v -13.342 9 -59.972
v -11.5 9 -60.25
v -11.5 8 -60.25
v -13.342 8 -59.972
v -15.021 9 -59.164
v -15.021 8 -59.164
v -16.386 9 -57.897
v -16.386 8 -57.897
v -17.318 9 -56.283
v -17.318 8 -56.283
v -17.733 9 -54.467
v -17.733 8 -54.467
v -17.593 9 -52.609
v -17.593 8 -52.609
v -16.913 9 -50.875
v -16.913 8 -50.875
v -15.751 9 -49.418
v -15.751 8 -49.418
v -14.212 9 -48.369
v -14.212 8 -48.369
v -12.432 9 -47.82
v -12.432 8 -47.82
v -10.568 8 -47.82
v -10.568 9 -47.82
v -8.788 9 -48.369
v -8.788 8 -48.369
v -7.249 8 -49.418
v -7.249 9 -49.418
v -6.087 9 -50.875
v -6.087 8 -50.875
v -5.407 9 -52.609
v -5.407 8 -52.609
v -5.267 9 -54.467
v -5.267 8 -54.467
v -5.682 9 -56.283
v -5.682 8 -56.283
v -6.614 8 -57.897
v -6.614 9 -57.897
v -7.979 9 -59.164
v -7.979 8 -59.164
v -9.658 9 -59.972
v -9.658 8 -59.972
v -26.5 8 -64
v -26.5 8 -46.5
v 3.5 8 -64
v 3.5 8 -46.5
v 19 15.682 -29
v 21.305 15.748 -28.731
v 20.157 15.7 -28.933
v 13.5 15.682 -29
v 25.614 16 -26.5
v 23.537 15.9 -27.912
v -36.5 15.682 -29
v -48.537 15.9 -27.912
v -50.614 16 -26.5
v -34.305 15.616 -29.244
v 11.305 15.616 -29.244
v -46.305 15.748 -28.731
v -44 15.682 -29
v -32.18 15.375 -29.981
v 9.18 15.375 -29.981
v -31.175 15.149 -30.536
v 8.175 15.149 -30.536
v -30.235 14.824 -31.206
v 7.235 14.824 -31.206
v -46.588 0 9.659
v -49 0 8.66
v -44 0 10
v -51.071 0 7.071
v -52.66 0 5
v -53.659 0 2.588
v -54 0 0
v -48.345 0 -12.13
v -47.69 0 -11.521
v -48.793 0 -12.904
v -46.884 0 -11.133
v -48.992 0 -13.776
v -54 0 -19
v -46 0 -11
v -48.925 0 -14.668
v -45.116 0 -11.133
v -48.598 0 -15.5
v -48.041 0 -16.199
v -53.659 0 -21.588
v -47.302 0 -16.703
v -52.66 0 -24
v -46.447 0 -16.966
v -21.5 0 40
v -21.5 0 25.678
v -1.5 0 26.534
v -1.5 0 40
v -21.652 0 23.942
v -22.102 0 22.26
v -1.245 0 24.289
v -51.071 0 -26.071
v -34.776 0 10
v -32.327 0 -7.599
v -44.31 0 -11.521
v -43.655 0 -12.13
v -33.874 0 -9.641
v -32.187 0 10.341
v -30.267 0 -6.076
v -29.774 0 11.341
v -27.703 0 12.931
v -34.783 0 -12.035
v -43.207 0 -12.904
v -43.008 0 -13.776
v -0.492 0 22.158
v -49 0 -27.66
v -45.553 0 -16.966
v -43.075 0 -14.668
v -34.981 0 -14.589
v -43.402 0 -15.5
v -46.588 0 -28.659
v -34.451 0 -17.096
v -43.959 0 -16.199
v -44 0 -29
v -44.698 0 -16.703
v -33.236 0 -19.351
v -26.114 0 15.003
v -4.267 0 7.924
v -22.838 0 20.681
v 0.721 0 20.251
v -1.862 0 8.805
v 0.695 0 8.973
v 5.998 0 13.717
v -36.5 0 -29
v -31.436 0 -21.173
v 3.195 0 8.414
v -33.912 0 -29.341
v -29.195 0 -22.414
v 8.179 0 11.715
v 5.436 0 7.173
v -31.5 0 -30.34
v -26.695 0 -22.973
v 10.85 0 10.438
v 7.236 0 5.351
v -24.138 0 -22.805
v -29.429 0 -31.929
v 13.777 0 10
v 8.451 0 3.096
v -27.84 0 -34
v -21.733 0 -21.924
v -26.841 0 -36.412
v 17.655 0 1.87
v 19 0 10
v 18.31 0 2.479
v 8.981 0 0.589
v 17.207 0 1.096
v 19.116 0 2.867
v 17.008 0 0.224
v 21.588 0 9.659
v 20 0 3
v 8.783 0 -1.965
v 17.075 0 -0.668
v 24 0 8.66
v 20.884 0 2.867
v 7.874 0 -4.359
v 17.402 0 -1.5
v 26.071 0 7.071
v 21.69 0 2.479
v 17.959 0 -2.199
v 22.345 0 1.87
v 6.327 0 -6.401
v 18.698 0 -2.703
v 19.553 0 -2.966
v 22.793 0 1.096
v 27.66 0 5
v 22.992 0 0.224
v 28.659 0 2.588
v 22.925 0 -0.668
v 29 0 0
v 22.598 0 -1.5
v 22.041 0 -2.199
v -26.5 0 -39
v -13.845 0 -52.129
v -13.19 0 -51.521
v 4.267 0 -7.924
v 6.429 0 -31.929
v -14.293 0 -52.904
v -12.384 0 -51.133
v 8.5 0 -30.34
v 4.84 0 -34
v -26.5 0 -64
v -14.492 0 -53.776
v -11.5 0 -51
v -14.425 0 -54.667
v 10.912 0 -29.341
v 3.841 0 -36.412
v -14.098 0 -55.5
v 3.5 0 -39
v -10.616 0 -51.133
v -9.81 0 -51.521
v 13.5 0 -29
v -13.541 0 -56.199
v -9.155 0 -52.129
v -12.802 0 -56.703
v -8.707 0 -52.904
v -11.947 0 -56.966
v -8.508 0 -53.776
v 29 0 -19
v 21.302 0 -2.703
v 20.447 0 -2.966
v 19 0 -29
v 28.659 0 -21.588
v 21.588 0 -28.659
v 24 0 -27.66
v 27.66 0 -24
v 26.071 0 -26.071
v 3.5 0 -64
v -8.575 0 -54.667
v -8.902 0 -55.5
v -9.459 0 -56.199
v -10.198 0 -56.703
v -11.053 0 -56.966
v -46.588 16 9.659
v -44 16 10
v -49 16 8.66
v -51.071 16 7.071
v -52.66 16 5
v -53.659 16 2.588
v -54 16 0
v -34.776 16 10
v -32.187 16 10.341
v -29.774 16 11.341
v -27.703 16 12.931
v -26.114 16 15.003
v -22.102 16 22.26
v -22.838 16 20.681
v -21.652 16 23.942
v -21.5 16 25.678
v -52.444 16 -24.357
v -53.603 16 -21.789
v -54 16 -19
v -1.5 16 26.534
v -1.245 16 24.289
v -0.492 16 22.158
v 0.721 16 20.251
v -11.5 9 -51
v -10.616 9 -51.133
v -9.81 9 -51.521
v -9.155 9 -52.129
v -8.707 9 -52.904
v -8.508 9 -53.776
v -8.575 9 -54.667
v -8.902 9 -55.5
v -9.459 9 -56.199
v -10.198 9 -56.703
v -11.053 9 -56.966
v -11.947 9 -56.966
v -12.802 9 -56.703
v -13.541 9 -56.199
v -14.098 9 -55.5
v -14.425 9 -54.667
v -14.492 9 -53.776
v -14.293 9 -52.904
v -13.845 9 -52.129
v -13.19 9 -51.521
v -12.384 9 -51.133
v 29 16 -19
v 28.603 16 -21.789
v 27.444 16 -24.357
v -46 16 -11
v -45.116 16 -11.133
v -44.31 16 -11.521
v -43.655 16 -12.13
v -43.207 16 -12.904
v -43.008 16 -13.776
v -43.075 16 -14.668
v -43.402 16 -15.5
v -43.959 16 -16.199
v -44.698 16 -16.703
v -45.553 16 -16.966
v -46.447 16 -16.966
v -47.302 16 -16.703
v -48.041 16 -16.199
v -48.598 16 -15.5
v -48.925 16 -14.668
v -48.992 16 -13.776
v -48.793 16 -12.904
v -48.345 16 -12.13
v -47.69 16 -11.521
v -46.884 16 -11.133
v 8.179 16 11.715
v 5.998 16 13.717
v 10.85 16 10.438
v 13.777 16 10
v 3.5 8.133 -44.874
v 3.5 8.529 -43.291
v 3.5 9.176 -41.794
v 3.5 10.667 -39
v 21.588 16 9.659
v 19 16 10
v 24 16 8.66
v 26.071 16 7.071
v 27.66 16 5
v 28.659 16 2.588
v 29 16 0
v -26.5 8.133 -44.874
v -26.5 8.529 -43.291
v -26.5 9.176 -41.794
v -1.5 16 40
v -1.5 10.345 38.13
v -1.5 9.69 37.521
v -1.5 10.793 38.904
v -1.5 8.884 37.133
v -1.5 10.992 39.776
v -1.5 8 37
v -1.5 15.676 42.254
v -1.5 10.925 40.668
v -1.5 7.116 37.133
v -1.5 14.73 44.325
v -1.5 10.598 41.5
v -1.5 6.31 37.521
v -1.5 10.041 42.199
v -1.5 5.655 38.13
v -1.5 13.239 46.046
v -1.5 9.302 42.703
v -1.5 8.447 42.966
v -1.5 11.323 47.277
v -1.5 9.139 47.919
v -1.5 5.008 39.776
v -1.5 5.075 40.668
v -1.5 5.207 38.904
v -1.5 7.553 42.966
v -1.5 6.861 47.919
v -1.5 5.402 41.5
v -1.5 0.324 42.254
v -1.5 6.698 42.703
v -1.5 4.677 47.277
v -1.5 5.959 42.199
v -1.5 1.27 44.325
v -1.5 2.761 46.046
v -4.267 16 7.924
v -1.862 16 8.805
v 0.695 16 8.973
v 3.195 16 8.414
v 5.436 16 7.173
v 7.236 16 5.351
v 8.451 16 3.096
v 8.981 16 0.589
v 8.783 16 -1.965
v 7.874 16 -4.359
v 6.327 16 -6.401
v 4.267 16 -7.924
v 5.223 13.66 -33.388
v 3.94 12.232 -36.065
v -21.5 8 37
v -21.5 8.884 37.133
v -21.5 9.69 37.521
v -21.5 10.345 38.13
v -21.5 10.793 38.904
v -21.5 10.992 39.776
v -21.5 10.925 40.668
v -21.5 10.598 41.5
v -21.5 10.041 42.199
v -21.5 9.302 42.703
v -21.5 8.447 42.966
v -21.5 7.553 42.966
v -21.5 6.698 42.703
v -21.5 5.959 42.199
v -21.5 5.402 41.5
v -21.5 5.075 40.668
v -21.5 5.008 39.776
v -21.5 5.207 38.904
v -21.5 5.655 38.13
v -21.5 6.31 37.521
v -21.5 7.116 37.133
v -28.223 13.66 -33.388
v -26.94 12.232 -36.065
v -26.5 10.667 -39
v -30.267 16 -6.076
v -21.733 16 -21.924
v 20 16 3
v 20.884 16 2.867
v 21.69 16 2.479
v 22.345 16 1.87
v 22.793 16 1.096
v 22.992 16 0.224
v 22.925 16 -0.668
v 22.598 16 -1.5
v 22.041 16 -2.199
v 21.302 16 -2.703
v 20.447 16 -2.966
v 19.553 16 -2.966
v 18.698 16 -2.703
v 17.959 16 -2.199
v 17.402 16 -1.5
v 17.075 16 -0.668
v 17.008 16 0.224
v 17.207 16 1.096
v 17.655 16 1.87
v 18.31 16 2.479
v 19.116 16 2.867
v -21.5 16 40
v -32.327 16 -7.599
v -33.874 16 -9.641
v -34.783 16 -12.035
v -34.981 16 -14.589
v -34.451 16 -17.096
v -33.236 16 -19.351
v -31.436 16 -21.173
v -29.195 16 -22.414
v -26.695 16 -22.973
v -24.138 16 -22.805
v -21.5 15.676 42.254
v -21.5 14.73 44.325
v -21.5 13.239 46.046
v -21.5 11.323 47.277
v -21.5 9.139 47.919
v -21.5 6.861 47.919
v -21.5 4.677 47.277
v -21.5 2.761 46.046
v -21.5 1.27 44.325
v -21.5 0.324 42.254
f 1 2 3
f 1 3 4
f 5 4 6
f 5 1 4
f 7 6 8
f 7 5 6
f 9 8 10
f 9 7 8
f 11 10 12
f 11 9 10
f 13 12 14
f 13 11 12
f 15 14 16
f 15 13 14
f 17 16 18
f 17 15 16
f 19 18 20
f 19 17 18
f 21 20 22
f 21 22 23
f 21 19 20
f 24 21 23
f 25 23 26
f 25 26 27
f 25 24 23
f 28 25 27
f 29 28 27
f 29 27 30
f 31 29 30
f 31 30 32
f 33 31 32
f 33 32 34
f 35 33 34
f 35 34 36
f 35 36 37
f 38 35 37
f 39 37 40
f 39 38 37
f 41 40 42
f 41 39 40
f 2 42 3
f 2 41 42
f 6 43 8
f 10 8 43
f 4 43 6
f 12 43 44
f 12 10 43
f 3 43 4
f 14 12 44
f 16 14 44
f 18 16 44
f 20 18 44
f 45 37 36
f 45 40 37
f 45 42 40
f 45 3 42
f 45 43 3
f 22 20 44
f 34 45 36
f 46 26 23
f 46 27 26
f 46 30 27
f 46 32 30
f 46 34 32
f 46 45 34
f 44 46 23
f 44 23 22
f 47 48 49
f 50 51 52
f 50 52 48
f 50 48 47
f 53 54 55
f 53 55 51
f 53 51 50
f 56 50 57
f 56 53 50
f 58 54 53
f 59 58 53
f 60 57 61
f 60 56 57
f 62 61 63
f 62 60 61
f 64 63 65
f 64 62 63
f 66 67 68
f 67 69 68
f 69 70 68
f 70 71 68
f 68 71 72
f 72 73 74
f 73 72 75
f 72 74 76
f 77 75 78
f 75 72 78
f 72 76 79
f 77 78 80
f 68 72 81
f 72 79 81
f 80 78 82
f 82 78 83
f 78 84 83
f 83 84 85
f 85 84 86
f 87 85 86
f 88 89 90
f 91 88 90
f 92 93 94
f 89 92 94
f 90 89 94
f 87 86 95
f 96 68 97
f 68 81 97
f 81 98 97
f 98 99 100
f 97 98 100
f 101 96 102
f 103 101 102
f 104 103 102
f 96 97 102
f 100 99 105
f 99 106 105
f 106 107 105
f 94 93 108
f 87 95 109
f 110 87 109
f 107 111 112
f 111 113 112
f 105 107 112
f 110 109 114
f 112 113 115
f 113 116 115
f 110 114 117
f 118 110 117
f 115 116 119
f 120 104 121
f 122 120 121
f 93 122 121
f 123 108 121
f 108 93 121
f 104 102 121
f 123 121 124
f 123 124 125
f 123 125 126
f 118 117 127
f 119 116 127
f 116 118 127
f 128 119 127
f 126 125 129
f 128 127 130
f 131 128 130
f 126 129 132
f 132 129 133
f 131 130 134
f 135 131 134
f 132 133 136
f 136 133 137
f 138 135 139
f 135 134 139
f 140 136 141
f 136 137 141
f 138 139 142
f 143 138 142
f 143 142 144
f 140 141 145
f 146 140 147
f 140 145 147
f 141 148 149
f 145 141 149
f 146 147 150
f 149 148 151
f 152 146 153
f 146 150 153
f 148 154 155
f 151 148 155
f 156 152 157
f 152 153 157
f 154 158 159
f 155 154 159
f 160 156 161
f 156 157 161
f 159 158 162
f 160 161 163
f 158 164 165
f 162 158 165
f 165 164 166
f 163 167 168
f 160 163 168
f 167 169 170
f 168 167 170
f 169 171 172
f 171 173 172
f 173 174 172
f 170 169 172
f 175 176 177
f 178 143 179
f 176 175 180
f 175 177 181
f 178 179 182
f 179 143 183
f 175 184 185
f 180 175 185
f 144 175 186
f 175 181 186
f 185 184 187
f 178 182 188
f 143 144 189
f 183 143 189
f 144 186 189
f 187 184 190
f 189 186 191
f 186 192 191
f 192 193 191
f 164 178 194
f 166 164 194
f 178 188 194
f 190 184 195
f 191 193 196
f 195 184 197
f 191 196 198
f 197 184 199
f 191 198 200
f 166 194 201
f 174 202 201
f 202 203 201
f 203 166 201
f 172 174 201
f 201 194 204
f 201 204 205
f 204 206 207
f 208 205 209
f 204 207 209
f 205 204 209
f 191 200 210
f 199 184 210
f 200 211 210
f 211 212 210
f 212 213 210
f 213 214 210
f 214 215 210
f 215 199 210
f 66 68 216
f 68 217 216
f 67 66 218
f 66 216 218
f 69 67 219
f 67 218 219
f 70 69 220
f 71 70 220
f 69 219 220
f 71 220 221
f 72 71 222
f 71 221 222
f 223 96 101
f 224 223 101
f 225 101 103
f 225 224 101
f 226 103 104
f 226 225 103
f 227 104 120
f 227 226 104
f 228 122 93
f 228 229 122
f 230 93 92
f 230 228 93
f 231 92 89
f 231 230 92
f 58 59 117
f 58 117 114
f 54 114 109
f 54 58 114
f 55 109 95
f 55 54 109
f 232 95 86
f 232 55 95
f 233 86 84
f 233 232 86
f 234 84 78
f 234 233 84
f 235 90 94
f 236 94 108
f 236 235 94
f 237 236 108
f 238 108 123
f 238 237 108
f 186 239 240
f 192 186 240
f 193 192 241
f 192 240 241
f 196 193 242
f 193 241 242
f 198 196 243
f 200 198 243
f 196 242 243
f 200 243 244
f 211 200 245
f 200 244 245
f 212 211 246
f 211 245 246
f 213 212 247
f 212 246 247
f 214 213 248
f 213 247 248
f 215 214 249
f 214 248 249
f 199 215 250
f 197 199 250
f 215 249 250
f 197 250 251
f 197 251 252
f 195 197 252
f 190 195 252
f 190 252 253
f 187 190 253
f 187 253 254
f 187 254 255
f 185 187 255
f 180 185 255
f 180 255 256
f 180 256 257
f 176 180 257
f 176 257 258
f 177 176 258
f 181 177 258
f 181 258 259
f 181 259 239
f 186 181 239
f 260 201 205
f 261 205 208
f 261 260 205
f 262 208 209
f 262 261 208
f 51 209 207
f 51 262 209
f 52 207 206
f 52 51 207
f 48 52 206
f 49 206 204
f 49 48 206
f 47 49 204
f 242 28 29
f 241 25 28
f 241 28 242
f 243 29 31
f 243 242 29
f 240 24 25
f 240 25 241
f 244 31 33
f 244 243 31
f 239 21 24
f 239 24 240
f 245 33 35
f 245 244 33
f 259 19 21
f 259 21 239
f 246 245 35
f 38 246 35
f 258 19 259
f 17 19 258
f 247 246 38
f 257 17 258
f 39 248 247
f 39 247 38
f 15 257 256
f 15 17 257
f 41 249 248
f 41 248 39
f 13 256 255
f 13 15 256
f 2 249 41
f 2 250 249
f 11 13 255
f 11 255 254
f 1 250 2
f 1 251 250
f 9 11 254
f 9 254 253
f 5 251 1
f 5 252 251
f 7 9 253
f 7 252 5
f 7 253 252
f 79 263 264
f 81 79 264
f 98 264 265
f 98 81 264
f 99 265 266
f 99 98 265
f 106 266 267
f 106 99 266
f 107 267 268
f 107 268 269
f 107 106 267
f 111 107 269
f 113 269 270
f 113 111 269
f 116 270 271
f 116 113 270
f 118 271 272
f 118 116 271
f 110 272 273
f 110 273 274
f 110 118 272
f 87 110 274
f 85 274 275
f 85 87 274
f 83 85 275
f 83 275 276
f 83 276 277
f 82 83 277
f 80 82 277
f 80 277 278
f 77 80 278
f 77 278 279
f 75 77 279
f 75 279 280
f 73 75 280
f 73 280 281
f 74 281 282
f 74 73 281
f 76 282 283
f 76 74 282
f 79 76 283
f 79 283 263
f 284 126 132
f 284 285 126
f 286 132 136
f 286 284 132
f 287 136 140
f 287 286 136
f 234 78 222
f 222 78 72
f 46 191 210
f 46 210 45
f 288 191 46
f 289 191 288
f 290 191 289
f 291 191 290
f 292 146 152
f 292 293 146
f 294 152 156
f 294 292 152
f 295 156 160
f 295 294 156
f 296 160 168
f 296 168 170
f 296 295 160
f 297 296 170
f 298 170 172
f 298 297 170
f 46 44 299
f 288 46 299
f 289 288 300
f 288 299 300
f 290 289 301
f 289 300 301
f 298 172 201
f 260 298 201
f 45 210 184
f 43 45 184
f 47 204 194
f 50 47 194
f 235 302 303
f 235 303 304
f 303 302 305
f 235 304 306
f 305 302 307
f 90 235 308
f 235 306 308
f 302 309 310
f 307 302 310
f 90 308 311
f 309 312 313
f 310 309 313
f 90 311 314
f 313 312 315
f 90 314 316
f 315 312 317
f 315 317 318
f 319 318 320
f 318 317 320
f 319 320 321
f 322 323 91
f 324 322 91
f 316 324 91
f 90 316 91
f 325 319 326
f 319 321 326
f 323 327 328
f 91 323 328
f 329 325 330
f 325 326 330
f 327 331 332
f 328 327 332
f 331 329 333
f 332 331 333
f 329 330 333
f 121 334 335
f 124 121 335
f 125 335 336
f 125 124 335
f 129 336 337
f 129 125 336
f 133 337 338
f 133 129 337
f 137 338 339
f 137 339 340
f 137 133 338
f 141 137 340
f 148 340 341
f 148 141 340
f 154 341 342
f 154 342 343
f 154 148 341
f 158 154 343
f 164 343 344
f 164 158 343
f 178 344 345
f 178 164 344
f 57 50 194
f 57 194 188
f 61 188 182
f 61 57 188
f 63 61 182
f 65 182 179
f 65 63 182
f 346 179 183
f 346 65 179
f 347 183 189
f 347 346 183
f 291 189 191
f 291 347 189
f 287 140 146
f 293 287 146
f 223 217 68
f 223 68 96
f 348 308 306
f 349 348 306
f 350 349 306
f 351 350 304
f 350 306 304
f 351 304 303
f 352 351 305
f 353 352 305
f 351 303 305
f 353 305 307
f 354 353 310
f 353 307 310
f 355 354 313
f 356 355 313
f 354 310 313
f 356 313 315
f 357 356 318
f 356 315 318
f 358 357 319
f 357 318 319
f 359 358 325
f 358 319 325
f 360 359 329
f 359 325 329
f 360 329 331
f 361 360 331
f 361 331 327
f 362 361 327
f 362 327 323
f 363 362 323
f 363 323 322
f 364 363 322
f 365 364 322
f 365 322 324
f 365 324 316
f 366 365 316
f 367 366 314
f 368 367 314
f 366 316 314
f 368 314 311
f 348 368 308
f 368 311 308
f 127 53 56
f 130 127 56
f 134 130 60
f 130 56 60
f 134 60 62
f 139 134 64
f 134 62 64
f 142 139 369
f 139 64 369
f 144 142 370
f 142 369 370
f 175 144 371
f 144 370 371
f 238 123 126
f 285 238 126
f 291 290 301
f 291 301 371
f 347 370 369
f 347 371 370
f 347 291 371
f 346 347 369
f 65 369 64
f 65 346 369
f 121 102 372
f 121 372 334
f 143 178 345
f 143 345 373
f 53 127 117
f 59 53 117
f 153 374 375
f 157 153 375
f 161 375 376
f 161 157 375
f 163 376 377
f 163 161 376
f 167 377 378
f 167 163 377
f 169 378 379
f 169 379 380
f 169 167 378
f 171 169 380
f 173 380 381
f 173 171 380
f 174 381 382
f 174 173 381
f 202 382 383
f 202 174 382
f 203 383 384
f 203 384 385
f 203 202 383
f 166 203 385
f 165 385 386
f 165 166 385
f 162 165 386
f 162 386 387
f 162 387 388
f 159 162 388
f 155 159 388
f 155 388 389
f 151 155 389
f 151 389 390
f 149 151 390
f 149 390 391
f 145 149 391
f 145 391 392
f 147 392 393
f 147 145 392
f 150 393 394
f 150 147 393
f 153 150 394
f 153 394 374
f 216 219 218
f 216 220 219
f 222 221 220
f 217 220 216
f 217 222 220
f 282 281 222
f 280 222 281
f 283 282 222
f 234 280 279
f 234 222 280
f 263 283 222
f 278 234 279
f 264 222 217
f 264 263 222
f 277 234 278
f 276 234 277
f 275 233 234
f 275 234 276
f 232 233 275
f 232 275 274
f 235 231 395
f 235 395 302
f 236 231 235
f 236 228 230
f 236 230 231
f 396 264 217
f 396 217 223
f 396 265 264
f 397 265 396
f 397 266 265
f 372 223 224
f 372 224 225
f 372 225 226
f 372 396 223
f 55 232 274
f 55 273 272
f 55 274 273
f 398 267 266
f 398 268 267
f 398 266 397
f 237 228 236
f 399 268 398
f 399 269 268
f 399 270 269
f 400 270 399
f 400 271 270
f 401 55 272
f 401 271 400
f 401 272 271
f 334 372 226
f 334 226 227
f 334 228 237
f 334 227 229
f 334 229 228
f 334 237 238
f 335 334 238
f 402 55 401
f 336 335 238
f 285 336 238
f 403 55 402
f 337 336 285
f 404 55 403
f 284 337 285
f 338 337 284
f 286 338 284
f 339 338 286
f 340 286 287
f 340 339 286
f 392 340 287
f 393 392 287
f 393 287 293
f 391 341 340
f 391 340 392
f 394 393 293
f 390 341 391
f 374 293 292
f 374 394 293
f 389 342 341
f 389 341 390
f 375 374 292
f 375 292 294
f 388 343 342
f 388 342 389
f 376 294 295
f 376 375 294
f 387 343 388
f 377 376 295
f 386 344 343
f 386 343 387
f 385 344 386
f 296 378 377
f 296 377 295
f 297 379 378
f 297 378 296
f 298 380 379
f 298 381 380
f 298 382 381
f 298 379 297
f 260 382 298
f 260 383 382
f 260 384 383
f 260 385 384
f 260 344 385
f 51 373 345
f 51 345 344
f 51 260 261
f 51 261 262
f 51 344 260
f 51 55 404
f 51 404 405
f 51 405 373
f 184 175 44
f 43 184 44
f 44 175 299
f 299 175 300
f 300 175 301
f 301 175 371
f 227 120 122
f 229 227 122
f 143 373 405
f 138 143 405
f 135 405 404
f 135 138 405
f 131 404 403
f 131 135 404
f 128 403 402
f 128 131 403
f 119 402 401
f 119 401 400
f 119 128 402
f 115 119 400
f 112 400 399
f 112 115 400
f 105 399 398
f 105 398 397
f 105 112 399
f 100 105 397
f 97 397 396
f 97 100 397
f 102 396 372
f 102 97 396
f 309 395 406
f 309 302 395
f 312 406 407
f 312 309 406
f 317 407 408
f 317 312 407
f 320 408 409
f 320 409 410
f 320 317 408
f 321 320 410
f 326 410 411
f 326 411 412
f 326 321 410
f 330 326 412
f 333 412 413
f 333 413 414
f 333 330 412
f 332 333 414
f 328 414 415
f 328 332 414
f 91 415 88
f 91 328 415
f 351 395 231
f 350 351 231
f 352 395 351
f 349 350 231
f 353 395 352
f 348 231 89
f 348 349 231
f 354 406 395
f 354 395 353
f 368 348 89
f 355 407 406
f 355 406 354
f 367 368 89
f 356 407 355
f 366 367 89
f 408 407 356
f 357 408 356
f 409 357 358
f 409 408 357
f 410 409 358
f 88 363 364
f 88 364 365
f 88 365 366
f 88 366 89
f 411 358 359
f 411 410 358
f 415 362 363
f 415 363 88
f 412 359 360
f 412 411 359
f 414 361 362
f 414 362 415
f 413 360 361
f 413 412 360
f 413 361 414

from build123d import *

# Parameters (mm, degrees)
SKETCH_1_R          = 3
EXTRUDE_1_DEPTH     = 16
SKETCH_5_W          = 20
SKETCH_5_H          = 8
REVOLVE_1_ANGLE     = 180
SKETCH_6_R          = 3
CUT_EXTRUDE_4_DEPTH = 20
CUT_EXTRUDE_3_DEPTH = 30
SKETCH_7_R          = 3
CUT_EXTRUDE_5_DEPTH = 85.118812266
EXTRUDE_START       = 1
SKETCH_9_R          = 6.25
SKETCH_9_R_2        = 3
EXTRUDE_2_DEPTH     = 1
FILLET_1_R          = 10
FILLET_START        = -52
FILLET_2_DEPTH      = 79
FILLET_START_2      = -26.5
FILLET_2_2_DEPTH    = 30


with BuildPart() as part:
    # 草图1 → 凸台-拉伸1 (new body)
    with BuildSketch(Plane(origin=(0, 0, 0), x_dir=(1, 0, 0), z_dir=(0, 1, 0))):
        Polygon((-54, -10.000198617), (-29, -10.000198617), (-21.5, -23), (-21.5, -40), (-1.5, -40), (-1.5, -23), (9, -10.000198617), (29, -10.000198617), (29, 28.999801383), (3.5, 28.999801383), (3.5, 63.999801383), (-26.5, 63.999801383), (-26.5, 28.999801383), (-54, 28.999801383), align=None)
        with Locations(Location((-46, 14, 0), (0, 0, 270))):
            Circle(SKETCH_1_R, mode=Mode.SUBTRACT)
        with Locations(Location((20, 0, 0), (0, 0, 270))):
            Circle(SKETCH_1_R, mode=Mode.SUBTRACT)
        with BuildLine():
            Line((-30.266898407, 6.075760101), (-4.266898407, -7.924239899))
            ThreePointArc((-4.266898407, -7.924239899), (7.924239899, -4.266898407), (4.266898407, 7.924239899))
            Line((4.266898407, 7.924239899), (-21.733101593, 21.924239899))
            ThreePointArc((-21.733101593, 21.924239899), (-33.924239899, 18.266898407), (-30.266898407, 6.075760101))
        make_face(mode=Mode.SUBTRACT)
    extrude(amount=EXTRUDE_1_DEPTH)

    # 草图5 → 旋转1 (revolve)
    with BuildSketch(Plane.XY.offset(40)):
        with Locations((-11.5, 12)):
            Rectangle(SKETCH_5_W, SKETCH_5_H)
    revolve(axis=Axis((-21.5, 8, 40), (1, 0, 0)), revolution_arc=REVOLVE_1_ANGLE)

    # 草图6 → 切除-拉伸4 (cut)
    with BuildSketch(Plane(origin=(-1.5, 0, 0), x_dir=(0, 0, -1), z_dir=(1, 0, 0))):
        with Locations((-40, 8)):
            Circle(SKETCH_6_R)
    extrude(amount=-CUT_EXTRUDE_4_DEPTH, mode=Mode.SUBTRACT)

    # 草图4 → 切除-拉伸3 (cut)
    with BuildSketch(Plane(origin=(3.5, 0, 0), x_dir=(0, 0, -1), z_dir=(1, 0, 0))):
        Polygon((28.999801383, 16), (63.999801383, 16), (63.999801383, 8), (43.999801383, 8), align=None)
    extrude(amount=-CUT_EXTRUDE_3_DEPTH, mode=Mode.SUBTRACT)

    # 草图7 → 切除-拉伸5 (cut, through all)
    with BuildSketch(Plane(origin=(0, 8, 0), x_dir=(1, 0, 0), z_dir=(0, 1, 0))):
        with Locations(Location((-11.5, 53.999801383, 0), (0, 0, 270))):
            Circle(SKETCH_7_R)
    extrude(amount=-CUT_EXTRUDE_5_DEPTH, mode=Mode.SUBTRACT)

    # 草图9 → 凸台-拉伸2 (add)
    with BuildSketch(Plane(origin=(0, 8, 0), x_dir=(1, 0, 0), z_dir=(0, 1, 0)).offset(EXTRUDE_START)):
        with Locations(Location((-11.5, 53.999801383, 0), (0, 0, 90))):
            Circle(SKETCH_9_R)
        with Locations(Location((-11.5, 53.999801383, 0), (0, 0, 270))):
            Circle(SKETCH_9_R_2, mode=Mode.SUBTRACT)
    extrude(amount=-EXTRUDE_2_DEPTH)

    # 圆角1
    fillet_1_edges = [part.edges().sort_by_distance(p)[0] for p in [
        (-21.5, 8, 23),
        (-29, 8, 10.000198617),
        (-54, 8, 10.000198617),
        (-54, 8, -28.999801383),
        (-26.5, 8, -28.999801383),
        (3.5, 8, -28.999801383),
        (29, 8, -28.999801383),
        (29, 8, 10.000198617),
        (9, 8, 10.000198617),
        (-1.5, 8, 23),
    ]]
    fillet(fillet_1_edges, radius=FILLET_1_R)

    # 圆角2: read off the stored shape, not the designer's step
    # 圆角2 outline → 圆角2 (cut)
    with BuildSketch(Plane.YZ.offset(FILLET_START)):
        with BuildLine():
            Line((14.823529412, -31.205683736), (16, -28.999801383))
            Line((16, -28.999801383), (16, -26.499801383))
            ThreePointArc((16, -26.499801383), (15.701425001, -28.925157633), (14.823529412, -31.205683736))
        make_face()
    extrude(amount=FILLET_2_DEPTH, mode=Mode.SUBTRACT)

    # Fillet 2 2 outline → Fillet 2 2 (add)
    with BuildSketch(Plane.YZ.offset(FILLET_START_2)):
        with BuildLine():
            Line((8, -43.999801383), (8, -46.499801383))
            ThreePointArc((8, -46.499801383), (8.298574999, -44.074445133), (9.176470588, -41.79391903))
            Line((9.176470588, -41.79391903), (8, -43.999801383))
        make_face()
    extrude(amount=FILLET_2_2_DEPTH)


solid = part.part
